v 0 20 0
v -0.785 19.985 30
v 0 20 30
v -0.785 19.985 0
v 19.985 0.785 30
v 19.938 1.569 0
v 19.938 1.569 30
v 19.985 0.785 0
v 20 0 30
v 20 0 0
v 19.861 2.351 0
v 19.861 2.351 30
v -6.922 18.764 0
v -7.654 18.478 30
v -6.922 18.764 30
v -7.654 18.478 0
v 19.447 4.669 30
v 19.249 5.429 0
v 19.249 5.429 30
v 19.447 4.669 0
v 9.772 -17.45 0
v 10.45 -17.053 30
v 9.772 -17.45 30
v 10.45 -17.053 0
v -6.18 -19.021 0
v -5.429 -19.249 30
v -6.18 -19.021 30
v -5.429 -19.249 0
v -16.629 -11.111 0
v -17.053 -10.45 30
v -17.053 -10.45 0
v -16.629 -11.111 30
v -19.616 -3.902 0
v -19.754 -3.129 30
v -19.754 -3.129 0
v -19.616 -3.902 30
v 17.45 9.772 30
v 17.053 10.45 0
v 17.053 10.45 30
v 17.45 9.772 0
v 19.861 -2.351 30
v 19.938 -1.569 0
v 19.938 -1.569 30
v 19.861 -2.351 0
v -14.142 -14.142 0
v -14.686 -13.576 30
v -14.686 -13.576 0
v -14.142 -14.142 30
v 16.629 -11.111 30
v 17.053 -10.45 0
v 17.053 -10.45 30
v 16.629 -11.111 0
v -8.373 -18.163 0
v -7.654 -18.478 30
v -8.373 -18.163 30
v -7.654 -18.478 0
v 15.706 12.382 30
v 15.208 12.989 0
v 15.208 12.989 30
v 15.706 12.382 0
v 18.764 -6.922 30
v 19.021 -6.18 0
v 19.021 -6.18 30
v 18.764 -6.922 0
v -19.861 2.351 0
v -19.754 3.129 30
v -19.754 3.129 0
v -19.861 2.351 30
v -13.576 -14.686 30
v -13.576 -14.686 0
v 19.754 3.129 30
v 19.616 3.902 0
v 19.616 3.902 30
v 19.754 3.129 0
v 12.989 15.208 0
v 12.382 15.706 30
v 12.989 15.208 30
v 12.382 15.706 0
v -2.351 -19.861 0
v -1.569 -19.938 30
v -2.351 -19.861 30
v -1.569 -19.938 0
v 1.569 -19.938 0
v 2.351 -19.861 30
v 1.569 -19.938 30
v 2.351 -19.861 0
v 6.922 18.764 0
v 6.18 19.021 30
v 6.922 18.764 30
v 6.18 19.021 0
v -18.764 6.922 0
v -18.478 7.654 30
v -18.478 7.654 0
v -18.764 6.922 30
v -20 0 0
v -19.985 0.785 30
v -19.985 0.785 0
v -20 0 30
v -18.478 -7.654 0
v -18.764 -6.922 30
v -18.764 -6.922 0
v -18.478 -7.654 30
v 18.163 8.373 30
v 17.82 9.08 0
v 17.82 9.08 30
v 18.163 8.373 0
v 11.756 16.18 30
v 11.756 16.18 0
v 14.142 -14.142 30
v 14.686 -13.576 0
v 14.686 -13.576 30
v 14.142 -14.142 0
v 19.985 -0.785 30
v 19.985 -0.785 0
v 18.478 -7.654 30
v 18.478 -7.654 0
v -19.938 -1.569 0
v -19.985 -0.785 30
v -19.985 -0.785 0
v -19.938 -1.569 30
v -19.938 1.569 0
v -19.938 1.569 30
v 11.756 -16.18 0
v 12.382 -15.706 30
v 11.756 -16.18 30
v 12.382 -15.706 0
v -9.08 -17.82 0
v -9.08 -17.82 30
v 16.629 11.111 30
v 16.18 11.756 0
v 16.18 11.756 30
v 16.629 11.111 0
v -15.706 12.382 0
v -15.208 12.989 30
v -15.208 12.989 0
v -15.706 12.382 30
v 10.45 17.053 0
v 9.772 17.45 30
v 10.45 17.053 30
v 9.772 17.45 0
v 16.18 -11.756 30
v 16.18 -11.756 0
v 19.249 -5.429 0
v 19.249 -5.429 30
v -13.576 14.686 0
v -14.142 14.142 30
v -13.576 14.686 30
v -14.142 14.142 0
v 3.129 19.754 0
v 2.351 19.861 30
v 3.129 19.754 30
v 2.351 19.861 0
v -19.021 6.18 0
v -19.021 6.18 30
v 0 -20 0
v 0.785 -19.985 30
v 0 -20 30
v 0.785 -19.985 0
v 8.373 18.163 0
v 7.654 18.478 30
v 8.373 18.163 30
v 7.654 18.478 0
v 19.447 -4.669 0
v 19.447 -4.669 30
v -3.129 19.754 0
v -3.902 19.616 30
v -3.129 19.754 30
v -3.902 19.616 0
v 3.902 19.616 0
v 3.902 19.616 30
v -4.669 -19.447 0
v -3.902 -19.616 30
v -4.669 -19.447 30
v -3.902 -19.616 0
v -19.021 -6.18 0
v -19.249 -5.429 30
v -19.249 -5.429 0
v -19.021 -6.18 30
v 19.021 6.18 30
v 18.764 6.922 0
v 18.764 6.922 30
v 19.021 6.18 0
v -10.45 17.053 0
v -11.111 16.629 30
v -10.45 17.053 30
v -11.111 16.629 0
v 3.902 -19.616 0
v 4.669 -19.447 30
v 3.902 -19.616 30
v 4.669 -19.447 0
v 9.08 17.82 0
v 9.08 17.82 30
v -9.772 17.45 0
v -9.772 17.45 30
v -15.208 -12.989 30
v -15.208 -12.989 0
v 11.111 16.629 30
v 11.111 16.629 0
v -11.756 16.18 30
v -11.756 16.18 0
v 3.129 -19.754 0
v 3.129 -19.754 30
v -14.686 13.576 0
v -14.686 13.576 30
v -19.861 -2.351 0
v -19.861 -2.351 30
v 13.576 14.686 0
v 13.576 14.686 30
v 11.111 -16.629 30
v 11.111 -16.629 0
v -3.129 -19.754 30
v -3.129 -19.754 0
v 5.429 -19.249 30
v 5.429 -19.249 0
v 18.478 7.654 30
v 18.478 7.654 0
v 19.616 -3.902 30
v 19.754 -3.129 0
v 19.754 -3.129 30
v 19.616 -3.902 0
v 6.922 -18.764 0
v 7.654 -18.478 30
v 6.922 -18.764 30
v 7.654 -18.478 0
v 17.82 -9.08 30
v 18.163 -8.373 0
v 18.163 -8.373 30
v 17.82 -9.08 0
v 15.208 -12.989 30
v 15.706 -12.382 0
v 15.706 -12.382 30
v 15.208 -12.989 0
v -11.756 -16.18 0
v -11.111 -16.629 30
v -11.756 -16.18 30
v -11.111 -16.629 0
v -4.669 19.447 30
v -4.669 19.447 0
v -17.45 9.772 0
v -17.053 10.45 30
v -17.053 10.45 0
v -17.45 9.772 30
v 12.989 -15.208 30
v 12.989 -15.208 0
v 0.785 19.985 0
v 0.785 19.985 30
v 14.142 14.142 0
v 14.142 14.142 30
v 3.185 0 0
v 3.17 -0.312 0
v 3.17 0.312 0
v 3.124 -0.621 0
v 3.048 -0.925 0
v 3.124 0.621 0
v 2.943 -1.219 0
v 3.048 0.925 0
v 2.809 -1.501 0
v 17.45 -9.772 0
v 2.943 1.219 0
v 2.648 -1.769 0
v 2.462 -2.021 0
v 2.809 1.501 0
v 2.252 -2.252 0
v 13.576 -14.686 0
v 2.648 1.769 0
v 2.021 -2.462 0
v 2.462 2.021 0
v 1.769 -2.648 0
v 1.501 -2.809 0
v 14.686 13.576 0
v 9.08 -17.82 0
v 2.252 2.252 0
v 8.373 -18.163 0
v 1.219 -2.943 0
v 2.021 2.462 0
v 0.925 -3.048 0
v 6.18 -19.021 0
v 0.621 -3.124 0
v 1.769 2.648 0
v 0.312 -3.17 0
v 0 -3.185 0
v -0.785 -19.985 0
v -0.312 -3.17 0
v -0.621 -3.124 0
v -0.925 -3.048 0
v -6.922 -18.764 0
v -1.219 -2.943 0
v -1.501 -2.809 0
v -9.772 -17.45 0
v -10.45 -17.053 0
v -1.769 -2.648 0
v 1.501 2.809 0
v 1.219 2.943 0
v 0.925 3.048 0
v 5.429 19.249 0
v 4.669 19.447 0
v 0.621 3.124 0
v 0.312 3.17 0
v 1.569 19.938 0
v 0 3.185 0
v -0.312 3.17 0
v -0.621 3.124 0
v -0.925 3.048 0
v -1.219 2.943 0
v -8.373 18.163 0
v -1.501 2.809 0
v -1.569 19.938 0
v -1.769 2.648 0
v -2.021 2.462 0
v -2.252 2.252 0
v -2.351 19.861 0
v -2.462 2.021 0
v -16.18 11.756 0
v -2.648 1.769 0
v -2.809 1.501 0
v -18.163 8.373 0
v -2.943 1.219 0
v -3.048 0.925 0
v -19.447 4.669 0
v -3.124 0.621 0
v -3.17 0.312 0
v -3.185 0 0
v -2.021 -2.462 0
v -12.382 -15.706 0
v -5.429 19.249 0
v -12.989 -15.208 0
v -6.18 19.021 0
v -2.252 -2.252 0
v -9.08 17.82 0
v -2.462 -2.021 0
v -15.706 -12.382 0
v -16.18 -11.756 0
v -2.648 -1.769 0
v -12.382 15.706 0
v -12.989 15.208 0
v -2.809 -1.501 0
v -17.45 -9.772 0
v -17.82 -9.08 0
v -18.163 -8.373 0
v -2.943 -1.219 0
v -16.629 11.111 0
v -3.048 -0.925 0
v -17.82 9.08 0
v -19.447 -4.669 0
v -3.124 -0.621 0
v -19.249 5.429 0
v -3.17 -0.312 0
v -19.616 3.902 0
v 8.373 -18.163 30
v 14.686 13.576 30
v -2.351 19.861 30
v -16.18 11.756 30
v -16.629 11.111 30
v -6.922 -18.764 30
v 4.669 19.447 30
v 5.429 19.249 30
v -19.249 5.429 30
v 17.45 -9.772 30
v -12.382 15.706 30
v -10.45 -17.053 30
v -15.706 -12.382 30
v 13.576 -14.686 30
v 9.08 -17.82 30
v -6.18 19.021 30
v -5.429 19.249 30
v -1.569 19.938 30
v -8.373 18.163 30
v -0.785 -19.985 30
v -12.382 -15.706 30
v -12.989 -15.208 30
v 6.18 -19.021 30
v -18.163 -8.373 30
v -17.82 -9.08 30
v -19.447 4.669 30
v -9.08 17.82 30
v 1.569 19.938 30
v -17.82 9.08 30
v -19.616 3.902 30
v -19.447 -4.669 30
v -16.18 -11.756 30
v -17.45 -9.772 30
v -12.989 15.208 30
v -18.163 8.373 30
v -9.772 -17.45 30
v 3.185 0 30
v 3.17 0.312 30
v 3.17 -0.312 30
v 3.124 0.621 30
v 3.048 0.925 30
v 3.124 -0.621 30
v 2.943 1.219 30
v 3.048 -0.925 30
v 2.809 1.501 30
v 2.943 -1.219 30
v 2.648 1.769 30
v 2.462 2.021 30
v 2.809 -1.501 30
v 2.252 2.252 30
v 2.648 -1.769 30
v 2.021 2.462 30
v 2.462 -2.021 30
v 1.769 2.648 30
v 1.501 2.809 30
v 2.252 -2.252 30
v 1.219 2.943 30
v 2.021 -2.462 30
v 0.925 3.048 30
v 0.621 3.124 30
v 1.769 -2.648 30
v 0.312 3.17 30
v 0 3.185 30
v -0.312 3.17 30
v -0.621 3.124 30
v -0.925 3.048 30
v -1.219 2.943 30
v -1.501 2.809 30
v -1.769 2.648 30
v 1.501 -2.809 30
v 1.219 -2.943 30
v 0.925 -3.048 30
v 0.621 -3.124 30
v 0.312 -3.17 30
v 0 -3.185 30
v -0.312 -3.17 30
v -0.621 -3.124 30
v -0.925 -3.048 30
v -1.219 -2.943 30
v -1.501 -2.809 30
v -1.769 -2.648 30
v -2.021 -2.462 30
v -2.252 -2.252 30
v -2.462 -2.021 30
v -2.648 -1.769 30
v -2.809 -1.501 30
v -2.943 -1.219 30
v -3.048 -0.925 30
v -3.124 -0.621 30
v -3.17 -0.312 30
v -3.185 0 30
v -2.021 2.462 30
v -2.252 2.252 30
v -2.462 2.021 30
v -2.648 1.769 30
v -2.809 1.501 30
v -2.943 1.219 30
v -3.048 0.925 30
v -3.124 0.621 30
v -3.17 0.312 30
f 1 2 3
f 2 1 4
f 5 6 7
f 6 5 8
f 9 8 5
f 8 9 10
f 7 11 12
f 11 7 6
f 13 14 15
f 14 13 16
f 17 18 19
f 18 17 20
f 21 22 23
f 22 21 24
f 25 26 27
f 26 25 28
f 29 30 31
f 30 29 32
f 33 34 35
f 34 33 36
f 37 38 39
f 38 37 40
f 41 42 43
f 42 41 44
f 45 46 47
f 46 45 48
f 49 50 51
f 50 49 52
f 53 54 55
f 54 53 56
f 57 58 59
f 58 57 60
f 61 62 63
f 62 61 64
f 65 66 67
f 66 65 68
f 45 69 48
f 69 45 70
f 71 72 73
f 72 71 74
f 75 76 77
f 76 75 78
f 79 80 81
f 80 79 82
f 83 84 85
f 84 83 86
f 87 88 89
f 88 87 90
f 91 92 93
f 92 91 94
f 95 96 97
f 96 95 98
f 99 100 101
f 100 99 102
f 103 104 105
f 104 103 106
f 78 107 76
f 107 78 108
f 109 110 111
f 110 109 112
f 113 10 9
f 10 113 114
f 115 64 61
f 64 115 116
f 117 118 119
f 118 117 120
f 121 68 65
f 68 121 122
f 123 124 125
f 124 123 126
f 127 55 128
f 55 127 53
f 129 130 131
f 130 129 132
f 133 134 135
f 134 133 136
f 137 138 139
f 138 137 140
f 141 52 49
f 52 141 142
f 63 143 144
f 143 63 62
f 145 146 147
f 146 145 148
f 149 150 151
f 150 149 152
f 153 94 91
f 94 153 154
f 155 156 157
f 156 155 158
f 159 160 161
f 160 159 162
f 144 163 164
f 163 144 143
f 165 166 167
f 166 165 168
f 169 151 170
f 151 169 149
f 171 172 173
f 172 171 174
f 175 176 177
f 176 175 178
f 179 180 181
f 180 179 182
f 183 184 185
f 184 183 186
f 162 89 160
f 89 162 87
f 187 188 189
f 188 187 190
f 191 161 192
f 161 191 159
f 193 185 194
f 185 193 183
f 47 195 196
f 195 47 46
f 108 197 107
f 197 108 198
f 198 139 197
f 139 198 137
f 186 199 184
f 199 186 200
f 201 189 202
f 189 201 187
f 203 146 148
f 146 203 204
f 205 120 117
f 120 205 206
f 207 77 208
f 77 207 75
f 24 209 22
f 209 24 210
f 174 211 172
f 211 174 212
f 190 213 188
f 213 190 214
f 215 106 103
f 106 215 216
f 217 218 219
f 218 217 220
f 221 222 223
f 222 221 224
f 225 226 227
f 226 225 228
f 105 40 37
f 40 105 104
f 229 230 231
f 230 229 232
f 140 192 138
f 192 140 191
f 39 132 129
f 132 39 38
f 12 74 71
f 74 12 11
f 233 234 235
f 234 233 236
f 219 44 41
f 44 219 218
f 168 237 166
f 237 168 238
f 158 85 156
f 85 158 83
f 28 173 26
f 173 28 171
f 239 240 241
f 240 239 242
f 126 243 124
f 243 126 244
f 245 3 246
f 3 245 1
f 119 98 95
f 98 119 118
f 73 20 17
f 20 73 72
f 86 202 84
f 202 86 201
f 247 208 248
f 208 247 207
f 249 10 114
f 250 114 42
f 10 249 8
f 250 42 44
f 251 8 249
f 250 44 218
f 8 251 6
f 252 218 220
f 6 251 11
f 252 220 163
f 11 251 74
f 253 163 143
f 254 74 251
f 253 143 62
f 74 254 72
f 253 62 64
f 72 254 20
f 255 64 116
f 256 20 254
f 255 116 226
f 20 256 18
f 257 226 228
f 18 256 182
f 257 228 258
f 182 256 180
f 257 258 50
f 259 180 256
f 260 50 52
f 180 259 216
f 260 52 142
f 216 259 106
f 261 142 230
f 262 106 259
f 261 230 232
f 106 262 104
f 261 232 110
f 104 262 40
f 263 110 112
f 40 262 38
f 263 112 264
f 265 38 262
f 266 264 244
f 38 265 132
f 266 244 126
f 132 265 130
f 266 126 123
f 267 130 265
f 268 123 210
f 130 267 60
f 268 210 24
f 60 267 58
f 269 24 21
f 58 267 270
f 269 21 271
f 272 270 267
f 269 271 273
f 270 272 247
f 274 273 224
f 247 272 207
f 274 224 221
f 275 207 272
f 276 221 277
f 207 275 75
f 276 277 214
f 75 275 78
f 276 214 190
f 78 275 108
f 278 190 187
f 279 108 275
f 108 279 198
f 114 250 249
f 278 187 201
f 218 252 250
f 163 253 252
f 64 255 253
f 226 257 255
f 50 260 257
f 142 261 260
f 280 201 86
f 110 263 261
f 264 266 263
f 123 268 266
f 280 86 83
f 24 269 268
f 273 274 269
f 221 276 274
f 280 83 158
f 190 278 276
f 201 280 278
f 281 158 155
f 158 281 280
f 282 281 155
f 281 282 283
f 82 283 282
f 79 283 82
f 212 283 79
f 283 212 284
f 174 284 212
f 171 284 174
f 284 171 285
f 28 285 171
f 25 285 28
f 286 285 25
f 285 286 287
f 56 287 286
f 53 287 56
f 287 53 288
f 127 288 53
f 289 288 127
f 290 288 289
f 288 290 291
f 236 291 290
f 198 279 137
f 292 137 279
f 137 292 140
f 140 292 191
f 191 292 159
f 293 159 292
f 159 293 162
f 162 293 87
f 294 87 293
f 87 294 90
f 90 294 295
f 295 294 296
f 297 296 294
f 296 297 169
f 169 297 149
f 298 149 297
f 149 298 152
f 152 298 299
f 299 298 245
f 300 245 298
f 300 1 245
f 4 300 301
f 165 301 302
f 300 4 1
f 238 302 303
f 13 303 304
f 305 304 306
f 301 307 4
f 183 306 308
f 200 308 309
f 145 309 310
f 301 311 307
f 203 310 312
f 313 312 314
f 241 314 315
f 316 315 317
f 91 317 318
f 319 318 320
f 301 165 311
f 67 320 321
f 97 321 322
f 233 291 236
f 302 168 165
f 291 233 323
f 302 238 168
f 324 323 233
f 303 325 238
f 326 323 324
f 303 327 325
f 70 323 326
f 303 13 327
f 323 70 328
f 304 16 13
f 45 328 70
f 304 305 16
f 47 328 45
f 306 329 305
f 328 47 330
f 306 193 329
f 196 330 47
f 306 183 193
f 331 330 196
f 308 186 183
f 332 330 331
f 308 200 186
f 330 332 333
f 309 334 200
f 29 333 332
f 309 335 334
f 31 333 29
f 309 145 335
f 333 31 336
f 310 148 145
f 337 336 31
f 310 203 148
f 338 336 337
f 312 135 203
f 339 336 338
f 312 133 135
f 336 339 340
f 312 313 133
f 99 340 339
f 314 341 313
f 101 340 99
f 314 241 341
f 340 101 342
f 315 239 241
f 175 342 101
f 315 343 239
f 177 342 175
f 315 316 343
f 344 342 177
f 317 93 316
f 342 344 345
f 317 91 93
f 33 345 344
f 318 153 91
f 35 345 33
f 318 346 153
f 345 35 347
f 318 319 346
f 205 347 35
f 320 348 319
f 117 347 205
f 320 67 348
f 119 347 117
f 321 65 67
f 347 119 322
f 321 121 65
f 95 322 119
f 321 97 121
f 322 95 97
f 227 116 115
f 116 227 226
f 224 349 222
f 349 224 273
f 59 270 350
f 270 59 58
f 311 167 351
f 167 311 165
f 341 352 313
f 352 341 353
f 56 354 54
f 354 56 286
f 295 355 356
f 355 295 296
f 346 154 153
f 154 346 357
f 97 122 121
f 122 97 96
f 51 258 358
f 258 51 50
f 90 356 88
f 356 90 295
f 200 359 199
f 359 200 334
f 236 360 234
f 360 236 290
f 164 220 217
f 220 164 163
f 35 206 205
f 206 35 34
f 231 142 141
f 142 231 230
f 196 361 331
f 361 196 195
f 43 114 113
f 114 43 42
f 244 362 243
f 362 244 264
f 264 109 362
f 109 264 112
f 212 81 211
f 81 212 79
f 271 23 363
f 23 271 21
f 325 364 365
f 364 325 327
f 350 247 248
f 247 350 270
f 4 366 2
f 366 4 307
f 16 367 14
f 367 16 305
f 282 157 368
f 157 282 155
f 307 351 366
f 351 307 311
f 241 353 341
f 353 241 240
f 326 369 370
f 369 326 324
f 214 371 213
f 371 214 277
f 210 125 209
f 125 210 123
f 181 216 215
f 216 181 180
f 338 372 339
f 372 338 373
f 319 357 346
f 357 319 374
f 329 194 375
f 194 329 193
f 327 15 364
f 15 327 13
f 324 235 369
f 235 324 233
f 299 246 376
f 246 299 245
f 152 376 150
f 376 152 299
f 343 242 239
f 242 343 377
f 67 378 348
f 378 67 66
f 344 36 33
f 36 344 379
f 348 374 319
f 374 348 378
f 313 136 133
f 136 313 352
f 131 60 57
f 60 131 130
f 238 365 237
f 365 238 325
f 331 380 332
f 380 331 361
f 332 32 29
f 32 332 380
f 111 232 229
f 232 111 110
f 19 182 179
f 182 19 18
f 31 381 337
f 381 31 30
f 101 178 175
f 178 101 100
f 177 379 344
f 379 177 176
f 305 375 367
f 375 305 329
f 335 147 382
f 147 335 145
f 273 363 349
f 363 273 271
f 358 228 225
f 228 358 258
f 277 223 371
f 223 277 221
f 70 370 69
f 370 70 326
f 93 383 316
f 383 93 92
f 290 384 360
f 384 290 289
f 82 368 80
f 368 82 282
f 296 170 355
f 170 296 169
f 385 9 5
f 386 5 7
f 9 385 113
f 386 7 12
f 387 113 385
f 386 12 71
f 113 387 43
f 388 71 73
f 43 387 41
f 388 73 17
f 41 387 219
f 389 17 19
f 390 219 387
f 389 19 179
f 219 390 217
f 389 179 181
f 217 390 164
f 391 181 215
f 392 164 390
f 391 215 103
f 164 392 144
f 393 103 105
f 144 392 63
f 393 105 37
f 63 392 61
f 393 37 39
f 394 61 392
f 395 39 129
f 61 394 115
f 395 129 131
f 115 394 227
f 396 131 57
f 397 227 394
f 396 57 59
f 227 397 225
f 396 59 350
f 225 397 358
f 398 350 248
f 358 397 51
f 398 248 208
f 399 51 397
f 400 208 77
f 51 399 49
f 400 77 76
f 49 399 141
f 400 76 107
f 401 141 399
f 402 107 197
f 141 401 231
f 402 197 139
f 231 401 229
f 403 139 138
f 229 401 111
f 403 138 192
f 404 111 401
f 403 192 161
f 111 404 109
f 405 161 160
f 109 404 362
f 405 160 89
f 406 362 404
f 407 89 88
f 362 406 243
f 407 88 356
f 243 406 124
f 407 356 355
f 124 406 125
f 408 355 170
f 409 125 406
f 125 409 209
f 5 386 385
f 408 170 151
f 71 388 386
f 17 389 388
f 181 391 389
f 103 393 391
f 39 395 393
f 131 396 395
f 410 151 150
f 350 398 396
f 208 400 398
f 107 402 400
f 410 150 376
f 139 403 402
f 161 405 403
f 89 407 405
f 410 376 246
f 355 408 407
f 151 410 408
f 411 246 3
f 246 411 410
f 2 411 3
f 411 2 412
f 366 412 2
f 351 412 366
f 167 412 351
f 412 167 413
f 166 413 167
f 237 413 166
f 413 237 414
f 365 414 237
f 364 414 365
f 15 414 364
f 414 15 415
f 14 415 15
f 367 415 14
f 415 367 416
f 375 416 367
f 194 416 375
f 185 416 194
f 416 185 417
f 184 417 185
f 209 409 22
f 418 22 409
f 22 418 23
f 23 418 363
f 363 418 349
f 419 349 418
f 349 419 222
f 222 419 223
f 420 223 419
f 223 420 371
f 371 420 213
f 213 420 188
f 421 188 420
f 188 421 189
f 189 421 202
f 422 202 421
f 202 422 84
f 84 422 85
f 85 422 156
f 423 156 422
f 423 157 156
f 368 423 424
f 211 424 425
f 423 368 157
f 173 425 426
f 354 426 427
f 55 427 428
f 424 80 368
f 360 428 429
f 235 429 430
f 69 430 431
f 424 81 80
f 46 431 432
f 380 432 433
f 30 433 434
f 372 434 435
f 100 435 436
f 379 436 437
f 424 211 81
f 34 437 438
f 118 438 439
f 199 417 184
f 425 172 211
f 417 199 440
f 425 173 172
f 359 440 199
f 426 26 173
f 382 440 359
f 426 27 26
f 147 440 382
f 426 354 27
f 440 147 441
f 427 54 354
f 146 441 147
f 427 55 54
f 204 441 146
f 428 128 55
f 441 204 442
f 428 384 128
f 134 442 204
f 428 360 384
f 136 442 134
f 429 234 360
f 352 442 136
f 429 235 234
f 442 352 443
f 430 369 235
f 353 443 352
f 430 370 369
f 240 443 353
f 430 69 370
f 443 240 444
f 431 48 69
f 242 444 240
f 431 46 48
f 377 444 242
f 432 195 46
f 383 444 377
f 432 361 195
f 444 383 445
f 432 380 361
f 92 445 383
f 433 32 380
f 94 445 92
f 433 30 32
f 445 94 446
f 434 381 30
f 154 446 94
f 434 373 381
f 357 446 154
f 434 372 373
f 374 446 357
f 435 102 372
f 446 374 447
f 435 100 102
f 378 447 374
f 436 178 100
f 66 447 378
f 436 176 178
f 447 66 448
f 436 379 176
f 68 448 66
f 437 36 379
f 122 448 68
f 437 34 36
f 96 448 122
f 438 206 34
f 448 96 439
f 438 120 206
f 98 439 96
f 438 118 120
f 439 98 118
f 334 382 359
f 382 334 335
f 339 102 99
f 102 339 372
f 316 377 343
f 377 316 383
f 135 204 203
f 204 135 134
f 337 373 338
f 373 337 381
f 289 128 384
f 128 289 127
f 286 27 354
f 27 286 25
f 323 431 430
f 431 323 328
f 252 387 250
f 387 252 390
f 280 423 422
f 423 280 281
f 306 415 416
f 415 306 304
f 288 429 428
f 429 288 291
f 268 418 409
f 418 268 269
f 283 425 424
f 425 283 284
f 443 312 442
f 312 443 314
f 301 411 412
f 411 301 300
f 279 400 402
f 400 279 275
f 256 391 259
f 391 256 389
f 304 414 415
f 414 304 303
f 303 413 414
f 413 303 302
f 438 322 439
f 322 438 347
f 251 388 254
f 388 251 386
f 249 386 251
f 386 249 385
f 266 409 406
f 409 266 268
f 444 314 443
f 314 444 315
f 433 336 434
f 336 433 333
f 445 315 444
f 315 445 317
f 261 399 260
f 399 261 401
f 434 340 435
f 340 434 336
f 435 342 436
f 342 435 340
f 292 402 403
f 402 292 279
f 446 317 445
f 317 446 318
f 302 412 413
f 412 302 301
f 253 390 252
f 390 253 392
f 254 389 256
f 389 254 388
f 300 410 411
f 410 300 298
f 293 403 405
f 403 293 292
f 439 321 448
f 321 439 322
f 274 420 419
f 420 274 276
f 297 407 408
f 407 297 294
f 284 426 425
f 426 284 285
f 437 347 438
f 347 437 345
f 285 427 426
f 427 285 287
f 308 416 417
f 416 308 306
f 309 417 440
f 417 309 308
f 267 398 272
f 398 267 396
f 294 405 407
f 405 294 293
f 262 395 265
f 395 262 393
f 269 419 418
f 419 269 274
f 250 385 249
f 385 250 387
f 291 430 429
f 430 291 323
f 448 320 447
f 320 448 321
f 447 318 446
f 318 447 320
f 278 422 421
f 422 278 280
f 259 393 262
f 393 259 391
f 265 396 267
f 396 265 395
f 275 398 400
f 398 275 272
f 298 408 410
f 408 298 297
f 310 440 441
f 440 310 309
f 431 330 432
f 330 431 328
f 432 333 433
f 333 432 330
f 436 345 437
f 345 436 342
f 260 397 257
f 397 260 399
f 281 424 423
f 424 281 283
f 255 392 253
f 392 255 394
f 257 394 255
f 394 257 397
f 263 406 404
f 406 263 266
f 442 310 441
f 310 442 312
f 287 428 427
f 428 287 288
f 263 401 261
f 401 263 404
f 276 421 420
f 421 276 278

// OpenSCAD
module Coupling(){
  difference(){
    cylinder(d=40,h=30,$fn=160);
    translate([0, 0, -0.1])cylinder(d=6.369999999999999,h=30.2,$fn=64);
  }
}
$fn=64;
color("DarkOliveGreen")Coupling();
